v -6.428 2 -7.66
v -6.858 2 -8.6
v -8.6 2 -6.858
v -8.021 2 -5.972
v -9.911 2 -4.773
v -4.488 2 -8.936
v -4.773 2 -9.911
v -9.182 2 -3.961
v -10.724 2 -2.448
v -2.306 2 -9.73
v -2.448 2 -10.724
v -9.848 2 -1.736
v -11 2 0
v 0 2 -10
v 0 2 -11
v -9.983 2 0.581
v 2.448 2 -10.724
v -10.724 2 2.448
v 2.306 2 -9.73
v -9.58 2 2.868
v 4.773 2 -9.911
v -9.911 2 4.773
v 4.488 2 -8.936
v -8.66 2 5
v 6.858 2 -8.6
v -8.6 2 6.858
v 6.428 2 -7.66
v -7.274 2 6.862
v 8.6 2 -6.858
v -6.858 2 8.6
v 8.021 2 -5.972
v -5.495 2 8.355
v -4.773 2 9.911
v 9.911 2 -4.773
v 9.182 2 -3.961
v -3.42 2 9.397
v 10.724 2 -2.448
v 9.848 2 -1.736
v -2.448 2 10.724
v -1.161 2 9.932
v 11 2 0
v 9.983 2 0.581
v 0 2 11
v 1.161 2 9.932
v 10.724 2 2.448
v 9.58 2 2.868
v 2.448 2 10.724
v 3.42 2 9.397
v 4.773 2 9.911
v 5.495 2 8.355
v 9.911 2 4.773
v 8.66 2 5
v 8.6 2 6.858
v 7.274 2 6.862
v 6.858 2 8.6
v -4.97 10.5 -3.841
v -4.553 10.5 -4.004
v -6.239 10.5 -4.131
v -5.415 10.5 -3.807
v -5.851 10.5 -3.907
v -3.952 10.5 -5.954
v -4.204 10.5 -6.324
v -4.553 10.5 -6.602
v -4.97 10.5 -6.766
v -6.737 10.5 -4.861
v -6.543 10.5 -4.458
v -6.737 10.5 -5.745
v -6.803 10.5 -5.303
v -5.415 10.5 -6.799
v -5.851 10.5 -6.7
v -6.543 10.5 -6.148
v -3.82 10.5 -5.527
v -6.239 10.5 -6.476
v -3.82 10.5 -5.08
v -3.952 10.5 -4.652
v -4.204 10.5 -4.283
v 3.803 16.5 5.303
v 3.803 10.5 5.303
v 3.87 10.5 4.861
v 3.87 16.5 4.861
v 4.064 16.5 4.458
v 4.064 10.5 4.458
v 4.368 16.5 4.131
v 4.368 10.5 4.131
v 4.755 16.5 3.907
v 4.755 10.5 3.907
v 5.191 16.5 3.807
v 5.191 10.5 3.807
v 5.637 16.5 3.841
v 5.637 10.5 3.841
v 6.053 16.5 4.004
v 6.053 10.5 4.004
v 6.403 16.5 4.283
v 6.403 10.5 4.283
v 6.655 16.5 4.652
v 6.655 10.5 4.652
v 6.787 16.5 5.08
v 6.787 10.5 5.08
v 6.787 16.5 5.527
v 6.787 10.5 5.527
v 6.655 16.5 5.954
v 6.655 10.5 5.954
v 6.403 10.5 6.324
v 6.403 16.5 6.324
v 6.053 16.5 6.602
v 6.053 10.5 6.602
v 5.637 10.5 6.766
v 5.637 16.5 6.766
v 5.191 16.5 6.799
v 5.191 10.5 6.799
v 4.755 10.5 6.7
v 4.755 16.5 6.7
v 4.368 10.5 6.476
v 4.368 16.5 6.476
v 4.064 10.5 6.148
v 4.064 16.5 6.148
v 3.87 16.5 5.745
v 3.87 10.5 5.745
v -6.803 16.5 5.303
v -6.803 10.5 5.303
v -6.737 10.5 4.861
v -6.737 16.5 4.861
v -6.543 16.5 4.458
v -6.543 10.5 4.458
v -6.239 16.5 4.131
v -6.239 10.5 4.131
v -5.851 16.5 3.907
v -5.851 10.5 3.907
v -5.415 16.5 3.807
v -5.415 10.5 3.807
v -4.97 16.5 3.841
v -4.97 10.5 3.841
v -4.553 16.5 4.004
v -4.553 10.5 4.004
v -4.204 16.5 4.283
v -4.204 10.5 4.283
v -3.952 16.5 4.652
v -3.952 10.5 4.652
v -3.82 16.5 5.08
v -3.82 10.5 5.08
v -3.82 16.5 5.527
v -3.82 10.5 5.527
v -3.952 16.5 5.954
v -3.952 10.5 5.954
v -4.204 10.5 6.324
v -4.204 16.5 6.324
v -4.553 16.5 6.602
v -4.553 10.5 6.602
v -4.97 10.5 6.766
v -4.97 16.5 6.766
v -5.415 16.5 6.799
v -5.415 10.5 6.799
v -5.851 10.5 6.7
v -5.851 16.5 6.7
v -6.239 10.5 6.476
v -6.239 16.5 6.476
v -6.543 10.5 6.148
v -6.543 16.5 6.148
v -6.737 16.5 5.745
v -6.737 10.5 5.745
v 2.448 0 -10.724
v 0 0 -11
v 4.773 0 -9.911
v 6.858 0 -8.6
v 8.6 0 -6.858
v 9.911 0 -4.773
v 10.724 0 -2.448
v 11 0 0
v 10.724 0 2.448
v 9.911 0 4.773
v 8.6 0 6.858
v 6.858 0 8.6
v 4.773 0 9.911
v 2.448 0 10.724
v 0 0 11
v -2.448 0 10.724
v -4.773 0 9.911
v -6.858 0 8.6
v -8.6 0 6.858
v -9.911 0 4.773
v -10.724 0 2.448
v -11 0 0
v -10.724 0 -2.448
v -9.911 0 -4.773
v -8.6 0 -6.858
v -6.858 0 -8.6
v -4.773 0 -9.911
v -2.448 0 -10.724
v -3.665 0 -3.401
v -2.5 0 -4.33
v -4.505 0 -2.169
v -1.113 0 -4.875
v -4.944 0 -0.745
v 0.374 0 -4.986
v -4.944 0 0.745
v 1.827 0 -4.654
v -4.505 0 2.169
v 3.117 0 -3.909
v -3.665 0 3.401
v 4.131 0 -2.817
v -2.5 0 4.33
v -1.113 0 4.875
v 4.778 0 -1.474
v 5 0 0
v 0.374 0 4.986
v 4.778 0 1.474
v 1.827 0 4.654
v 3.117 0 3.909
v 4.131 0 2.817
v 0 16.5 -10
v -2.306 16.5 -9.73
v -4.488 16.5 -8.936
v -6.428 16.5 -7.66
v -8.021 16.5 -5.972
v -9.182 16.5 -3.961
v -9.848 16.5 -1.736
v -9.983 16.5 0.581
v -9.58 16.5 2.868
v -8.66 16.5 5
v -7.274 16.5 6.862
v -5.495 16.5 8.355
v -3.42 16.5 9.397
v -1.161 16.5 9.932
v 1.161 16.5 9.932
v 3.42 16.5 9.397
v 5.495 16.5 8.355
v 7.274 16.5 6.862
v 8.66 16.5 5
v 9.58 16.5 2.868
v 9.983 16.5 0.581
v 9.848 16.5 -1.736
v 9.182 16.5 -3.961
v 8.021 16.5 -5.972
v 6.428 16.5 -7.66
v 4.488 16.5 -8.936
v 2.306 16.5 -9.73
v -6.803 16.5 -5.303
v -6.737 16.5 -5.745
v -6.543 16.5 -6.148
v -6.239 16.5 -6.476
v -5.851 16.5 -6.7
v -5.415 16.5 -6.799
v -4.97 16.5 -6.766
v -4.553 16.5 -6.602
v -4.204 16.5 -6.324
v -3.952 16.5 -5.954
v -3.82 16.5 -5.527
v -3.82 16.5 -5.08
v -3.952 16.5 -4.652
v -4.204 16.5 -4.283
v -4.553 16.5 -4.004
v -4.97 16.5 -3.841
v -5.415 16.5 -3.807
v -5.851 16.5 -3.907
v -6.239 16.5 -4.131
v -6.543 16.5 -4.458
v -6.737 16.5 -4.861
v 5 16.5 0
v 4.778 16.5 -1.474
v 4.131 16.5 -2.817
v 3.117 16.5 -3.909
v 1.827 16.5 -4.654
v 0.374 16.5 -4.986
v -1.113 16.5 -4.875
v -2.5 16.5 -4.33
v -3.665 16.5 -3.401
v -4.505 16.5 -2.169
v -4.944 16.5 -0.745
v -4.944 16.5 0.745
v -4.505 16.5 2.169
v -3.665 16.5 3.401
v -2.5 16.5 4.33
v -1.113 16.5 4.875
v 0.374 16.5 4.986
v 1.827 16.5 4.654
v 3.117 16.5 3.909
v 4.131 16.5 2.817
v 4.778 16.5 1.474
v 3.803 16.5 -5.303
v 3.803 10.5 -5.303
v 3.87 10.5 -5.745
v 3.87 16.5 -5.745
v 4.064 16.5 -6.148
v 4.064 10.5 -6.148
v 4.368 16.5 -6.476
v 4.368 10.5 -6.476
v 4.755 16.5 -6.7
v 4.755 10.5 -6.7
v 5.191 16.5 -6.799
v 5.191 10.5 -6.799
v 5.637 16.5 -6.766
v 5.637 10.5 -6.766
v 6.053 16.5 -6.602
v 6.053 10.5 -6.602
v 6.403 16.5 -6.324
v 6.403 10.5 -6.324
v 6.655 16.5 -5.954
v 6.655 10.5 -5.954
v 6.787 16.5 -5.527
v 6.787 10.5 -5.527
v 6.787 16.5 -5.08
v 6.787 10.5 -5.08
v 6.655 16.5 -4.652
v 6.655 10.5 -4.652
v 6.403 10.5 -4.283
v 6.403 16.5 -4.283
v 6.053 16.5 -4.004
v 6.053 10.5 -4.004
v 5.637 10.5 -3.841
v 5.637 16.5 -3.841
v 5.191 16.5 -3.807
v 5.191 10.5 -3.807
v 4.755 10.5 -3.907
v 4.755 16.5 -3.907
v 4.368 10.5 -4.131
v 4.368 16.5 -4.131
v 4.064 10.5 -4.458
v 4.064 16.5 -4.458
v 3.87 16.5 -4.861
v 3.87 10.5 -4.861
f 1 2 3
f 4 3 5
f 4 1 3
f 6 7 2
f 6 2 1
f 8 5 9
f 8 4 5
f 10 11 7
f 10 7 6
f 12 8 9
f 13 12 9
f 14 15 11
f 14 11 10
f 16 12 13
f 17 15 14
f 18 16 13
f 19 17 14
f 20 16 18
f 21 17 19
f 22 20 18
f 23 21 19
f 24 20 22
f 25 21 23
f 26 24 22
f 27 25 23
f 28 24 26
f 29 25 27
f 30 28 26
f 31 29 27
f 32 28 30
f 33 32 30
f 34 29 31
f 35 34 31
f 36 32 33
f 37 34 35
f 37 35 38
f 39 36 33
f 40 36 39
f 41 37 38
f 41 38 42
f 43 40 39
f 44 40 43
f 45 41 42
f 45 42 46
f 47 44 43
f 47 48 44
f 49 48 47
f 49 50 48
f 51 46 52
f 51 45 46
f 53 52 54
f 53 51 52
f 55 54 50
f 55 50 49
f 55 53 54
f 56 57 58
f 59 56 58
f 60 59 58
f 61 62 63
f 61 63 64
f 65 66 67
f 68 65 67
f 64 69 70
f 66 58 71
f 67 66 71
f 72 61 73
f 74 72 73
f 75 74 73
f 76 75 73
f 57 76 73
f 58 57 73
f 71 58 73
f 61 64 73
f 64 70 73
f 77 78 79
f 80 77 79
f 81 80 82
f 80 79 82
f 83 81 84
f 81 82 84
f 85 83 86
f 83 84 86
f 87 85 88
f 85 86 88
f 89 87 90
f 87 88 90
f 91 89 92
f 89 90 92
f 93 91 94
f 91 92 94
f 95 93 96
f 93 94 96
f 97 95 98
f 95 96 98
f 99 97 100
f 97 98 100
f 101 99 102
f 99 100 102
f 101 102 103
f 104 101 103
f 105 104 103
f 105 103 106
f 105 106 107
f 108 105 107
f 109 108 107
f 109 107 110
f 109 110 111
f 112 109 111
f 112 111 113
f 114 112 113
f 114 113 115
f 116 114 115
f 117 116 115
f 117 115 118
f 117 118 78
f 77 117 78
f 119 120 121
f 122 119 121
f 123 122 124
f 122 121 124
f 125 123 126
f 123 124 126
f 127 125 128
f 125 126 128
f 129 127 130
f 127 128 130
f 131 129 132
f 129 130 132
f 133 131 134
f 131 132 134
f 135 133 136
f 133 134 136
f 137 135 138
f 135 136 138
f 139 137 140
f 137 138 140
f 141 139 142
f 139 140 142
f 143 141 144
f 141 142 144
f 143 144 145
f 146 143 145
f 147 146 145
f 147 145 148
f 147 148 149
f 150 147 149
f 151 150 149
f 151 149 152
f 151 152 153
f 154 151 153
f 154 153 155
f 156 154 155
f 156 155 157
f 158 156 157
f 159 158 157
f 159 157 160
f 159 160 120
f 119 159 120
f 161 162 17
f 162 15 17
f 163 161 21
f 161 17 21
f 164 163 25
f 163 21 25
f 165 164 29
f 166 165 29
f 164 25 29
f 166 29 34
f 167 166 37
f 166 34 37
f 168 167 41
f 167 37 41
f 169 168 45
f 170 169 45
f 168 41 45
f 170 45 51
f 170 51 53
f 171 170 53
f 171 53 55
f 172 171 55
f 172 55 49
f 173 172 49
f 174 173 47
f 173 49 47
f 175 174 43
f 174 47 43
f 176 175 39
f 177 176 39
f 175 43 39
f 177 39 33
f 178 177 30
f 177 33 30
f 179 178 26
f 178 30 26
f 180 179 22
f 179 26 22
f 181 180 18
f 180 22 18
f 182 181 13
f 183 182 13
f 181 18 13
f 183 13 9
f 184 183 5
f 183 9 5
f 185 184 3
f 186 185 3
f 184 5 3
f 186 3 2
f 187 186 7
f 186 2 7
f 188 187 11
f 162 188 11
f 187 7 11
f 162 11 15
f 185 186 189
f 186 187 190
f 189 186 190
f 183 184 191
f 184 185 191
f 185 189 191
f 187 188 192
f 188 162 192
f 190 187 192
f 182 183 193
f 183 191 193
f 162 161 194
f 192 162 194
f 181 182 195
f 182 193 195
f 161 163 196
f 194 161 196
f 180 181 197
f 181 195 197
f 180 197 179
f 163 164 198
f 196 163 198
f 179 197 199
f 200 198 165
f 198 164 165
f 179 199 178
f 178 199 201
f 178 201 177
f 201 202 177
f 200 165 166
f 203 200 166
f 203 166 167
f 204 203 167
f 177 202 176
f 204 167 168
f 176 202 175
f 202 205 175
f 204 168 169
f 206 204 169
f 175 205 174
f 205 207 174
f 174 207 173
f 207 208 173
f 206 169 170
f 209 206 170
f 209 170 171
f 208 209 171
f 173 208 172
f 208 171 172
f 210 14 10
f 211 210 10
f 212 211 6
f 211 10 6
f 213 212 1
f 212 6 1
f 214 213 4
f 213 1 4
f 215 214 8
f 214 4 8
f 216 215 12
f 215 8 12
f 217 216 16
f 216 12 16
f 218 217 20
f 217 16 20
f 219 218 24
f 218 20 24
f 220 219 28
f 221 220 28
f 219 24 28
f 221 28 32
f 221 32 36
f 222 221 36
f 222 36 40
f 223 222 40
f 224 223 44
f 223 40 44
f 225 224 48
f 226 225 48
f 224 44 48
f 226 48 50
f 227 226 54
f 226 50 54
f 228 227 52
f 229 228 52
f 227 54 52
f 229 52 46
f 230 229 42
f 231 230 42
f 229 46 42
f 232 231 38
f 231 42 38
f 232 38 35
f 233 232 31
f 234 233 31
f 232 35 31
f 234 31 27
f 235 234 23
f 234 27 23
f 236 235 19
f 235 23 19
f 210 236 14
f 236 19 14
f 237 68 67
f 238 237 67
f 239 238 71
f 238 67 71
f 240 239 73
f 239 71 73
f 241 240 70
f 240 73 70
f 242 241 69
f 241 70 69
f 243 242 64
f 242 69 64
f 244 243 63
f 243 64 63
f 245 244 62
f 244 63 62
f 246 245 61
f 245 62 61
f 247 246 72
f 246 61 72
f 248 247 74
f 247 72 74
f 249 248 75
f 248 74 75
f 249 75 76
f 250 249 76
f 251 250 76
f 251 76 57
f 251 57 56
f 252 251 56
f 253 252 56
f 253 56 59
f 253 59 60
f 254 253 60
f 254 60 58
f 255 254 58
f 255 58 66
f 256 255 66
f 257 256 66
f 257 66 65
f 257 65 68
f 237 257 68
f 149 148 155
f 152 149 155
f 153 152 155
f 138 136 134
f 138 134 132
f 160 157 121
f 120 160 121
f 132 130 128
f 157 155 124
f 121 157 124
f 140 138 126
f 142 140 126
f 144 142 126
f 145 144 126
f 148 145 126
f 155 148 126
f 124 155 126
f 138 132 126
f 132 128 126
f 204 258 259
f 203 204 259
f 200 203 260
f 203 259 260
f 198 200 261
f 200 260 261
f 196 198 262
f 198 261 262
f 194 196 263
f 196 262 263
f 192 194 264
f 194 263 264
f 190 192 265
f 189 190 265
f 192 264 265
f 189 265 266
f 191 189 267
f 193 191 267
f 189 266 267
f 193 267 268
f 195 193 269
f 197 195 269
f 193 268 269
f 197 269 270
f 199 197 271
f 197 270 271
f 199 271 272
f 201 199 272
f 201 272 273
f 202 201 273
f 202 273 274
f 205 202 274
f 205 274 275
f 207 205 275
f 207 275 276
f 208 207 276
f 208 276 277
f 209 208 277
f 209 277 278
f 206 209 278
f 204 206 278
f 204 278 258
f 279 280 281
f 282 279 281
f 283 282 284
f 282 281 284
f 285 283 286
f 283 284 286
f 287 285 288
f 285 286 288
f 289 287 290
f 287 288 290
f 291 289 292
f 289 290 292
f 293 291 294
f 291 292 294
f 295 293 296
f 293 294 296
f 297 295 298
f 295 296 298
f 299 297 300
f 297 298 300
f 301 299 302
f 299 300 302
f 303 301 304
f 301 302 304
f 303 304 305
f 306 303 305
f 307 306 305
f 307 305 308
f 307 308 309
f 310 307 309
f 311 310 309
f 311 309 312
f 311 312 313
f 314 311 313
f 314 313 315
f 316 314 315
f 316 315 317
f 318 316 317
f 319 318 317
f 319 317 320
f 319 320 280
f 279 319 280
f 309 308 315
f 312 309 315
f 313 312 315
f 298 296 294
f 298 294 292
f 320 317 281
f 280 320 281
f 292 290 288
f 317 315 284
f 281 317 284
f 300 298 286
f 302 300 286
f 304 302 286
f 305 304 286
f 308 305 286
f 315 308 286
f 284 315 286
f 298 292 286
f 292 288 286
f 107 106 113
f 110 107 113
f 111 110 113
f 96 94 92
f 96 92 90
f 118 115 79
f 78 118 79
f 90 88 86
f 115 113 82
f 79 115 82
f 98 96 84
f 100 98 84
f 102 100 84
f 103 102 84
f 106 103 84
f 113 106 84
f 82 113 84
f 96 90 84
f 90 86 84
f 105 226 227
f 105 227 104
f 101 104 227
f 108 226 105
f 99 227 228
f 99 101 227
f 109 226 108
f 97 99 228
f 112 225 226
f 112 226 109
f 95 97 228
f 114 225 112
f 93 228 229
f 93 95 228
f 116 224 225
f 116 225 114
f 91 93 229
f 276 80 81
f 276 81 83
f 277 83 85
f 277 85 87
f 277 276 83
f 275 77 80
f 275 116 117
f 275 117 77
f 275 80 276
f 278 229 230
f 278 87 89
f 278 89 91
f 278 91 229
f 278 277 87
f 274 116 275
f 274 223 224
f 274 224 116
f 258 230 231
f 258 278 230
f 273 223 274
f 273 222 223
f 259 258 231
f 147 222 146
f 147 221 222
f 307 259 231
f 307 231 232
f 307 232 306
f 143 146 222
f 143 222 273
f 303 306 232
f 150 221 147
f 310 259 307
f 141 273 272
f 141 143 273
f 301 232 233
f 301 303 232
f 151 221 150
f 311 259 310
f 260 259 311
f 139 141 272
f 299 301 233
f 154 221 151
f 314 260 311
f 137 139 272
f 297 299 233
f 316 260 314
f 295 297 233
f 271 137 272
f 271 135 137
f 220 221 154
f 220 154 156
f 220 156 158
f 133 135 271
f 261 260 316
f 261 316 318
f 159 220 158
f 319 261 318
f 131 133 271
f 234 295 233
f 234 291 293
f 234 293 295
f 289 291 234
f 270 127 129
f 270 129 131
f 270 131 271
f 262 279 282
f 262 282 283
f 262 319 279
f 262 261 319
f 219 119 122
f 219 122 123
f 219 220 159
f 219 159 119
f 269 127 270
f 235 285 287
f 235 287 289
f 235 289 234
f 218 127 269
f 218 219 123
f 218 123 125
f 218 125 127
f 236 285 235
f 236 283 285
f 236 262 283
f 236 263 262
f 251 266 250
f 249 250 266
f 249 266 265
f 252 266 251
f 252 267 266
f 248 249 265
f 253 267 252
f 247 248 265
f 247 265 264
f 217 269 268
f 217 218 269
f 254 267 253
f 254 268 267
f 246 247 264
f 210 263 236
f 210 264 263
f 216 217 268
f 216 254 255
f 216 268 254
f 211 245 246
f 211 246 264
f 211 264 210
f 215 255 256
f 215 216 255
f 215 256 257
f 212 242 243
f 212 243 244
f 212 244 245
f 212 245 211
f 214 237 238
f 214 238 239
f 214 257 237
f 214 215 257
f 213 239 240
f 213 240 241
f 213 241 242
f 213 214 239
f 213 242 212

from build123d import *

# Parameters (mm, degrees)
SKETCH_1_W                = 11
SKETCH_1_H                = 2
SKETCH_2_R                = 10
EXTRUDE_1_DEPTH           = 14.5
HOLE_WIZARD_3_0_3_1_D     = 3
HOLE_WIZARD_3_0_3_1_DEPTH = 6
HOLE_WIZARD_10_0_10_1_D   = 10


with BuildPart() as part:
    # 草图1 → 旋转1 (revolve)
    with BuildSketch(Plane.XY, mode=Mode.PRIVATE) as revolve_1_sk:
        with Locations((5.5, 1)):
            Rectangle(SKETCH_1_W, SKETCH_1_H)
    revolve(revolve_1_sk.sketch.rotate(Axis((0, 2, 0), (0, -1, 0)), 270), axis=Axis((0, 2, 0), (0, -1, 0)))

    # 草图2 → 凸台-拉伸1 (add)
    with BuildSketch(Plane(origin=(0, 2, 0), x_dir=(-1, 0, 0), z_dir=(0, 1, 0))):
        with Locations(Location((0, 0, 0), (0, 0, 270))):
            Circle(SKETCH_2_R)
    extrude(amount=EXTRUDE_1_DEPTH)

    # Ø3.0 (3) 直径孔1
    with Locations(Plane(origin=(0, 16.5, 0), x_dir=(1, 0, 0), z_dir=(0, 1, 0))):
        with Locations((5.303300859, 5.303300859), (5.303300859, -5.303300859), (-5.303300859, -5.303300859), (-5.303300859, 5.303300859)):
            Hole(HOLE_WIZARD_3_0_3_1_D / 2, depth=HOLE_WIZARD_3_0_3_1_DEPTH)

    # Ø10.0 (10) 直径孔1 (through all)
    with Locations(Plane(origin=(0, 0, 0), x_dir=(-1, 0, 0), z_dir=(0, -1, 0))):
        with Locations((0, 0)):
            Hole(HOLE_WIZARD_10_0_10_1_D / 2)


solid = part.part
